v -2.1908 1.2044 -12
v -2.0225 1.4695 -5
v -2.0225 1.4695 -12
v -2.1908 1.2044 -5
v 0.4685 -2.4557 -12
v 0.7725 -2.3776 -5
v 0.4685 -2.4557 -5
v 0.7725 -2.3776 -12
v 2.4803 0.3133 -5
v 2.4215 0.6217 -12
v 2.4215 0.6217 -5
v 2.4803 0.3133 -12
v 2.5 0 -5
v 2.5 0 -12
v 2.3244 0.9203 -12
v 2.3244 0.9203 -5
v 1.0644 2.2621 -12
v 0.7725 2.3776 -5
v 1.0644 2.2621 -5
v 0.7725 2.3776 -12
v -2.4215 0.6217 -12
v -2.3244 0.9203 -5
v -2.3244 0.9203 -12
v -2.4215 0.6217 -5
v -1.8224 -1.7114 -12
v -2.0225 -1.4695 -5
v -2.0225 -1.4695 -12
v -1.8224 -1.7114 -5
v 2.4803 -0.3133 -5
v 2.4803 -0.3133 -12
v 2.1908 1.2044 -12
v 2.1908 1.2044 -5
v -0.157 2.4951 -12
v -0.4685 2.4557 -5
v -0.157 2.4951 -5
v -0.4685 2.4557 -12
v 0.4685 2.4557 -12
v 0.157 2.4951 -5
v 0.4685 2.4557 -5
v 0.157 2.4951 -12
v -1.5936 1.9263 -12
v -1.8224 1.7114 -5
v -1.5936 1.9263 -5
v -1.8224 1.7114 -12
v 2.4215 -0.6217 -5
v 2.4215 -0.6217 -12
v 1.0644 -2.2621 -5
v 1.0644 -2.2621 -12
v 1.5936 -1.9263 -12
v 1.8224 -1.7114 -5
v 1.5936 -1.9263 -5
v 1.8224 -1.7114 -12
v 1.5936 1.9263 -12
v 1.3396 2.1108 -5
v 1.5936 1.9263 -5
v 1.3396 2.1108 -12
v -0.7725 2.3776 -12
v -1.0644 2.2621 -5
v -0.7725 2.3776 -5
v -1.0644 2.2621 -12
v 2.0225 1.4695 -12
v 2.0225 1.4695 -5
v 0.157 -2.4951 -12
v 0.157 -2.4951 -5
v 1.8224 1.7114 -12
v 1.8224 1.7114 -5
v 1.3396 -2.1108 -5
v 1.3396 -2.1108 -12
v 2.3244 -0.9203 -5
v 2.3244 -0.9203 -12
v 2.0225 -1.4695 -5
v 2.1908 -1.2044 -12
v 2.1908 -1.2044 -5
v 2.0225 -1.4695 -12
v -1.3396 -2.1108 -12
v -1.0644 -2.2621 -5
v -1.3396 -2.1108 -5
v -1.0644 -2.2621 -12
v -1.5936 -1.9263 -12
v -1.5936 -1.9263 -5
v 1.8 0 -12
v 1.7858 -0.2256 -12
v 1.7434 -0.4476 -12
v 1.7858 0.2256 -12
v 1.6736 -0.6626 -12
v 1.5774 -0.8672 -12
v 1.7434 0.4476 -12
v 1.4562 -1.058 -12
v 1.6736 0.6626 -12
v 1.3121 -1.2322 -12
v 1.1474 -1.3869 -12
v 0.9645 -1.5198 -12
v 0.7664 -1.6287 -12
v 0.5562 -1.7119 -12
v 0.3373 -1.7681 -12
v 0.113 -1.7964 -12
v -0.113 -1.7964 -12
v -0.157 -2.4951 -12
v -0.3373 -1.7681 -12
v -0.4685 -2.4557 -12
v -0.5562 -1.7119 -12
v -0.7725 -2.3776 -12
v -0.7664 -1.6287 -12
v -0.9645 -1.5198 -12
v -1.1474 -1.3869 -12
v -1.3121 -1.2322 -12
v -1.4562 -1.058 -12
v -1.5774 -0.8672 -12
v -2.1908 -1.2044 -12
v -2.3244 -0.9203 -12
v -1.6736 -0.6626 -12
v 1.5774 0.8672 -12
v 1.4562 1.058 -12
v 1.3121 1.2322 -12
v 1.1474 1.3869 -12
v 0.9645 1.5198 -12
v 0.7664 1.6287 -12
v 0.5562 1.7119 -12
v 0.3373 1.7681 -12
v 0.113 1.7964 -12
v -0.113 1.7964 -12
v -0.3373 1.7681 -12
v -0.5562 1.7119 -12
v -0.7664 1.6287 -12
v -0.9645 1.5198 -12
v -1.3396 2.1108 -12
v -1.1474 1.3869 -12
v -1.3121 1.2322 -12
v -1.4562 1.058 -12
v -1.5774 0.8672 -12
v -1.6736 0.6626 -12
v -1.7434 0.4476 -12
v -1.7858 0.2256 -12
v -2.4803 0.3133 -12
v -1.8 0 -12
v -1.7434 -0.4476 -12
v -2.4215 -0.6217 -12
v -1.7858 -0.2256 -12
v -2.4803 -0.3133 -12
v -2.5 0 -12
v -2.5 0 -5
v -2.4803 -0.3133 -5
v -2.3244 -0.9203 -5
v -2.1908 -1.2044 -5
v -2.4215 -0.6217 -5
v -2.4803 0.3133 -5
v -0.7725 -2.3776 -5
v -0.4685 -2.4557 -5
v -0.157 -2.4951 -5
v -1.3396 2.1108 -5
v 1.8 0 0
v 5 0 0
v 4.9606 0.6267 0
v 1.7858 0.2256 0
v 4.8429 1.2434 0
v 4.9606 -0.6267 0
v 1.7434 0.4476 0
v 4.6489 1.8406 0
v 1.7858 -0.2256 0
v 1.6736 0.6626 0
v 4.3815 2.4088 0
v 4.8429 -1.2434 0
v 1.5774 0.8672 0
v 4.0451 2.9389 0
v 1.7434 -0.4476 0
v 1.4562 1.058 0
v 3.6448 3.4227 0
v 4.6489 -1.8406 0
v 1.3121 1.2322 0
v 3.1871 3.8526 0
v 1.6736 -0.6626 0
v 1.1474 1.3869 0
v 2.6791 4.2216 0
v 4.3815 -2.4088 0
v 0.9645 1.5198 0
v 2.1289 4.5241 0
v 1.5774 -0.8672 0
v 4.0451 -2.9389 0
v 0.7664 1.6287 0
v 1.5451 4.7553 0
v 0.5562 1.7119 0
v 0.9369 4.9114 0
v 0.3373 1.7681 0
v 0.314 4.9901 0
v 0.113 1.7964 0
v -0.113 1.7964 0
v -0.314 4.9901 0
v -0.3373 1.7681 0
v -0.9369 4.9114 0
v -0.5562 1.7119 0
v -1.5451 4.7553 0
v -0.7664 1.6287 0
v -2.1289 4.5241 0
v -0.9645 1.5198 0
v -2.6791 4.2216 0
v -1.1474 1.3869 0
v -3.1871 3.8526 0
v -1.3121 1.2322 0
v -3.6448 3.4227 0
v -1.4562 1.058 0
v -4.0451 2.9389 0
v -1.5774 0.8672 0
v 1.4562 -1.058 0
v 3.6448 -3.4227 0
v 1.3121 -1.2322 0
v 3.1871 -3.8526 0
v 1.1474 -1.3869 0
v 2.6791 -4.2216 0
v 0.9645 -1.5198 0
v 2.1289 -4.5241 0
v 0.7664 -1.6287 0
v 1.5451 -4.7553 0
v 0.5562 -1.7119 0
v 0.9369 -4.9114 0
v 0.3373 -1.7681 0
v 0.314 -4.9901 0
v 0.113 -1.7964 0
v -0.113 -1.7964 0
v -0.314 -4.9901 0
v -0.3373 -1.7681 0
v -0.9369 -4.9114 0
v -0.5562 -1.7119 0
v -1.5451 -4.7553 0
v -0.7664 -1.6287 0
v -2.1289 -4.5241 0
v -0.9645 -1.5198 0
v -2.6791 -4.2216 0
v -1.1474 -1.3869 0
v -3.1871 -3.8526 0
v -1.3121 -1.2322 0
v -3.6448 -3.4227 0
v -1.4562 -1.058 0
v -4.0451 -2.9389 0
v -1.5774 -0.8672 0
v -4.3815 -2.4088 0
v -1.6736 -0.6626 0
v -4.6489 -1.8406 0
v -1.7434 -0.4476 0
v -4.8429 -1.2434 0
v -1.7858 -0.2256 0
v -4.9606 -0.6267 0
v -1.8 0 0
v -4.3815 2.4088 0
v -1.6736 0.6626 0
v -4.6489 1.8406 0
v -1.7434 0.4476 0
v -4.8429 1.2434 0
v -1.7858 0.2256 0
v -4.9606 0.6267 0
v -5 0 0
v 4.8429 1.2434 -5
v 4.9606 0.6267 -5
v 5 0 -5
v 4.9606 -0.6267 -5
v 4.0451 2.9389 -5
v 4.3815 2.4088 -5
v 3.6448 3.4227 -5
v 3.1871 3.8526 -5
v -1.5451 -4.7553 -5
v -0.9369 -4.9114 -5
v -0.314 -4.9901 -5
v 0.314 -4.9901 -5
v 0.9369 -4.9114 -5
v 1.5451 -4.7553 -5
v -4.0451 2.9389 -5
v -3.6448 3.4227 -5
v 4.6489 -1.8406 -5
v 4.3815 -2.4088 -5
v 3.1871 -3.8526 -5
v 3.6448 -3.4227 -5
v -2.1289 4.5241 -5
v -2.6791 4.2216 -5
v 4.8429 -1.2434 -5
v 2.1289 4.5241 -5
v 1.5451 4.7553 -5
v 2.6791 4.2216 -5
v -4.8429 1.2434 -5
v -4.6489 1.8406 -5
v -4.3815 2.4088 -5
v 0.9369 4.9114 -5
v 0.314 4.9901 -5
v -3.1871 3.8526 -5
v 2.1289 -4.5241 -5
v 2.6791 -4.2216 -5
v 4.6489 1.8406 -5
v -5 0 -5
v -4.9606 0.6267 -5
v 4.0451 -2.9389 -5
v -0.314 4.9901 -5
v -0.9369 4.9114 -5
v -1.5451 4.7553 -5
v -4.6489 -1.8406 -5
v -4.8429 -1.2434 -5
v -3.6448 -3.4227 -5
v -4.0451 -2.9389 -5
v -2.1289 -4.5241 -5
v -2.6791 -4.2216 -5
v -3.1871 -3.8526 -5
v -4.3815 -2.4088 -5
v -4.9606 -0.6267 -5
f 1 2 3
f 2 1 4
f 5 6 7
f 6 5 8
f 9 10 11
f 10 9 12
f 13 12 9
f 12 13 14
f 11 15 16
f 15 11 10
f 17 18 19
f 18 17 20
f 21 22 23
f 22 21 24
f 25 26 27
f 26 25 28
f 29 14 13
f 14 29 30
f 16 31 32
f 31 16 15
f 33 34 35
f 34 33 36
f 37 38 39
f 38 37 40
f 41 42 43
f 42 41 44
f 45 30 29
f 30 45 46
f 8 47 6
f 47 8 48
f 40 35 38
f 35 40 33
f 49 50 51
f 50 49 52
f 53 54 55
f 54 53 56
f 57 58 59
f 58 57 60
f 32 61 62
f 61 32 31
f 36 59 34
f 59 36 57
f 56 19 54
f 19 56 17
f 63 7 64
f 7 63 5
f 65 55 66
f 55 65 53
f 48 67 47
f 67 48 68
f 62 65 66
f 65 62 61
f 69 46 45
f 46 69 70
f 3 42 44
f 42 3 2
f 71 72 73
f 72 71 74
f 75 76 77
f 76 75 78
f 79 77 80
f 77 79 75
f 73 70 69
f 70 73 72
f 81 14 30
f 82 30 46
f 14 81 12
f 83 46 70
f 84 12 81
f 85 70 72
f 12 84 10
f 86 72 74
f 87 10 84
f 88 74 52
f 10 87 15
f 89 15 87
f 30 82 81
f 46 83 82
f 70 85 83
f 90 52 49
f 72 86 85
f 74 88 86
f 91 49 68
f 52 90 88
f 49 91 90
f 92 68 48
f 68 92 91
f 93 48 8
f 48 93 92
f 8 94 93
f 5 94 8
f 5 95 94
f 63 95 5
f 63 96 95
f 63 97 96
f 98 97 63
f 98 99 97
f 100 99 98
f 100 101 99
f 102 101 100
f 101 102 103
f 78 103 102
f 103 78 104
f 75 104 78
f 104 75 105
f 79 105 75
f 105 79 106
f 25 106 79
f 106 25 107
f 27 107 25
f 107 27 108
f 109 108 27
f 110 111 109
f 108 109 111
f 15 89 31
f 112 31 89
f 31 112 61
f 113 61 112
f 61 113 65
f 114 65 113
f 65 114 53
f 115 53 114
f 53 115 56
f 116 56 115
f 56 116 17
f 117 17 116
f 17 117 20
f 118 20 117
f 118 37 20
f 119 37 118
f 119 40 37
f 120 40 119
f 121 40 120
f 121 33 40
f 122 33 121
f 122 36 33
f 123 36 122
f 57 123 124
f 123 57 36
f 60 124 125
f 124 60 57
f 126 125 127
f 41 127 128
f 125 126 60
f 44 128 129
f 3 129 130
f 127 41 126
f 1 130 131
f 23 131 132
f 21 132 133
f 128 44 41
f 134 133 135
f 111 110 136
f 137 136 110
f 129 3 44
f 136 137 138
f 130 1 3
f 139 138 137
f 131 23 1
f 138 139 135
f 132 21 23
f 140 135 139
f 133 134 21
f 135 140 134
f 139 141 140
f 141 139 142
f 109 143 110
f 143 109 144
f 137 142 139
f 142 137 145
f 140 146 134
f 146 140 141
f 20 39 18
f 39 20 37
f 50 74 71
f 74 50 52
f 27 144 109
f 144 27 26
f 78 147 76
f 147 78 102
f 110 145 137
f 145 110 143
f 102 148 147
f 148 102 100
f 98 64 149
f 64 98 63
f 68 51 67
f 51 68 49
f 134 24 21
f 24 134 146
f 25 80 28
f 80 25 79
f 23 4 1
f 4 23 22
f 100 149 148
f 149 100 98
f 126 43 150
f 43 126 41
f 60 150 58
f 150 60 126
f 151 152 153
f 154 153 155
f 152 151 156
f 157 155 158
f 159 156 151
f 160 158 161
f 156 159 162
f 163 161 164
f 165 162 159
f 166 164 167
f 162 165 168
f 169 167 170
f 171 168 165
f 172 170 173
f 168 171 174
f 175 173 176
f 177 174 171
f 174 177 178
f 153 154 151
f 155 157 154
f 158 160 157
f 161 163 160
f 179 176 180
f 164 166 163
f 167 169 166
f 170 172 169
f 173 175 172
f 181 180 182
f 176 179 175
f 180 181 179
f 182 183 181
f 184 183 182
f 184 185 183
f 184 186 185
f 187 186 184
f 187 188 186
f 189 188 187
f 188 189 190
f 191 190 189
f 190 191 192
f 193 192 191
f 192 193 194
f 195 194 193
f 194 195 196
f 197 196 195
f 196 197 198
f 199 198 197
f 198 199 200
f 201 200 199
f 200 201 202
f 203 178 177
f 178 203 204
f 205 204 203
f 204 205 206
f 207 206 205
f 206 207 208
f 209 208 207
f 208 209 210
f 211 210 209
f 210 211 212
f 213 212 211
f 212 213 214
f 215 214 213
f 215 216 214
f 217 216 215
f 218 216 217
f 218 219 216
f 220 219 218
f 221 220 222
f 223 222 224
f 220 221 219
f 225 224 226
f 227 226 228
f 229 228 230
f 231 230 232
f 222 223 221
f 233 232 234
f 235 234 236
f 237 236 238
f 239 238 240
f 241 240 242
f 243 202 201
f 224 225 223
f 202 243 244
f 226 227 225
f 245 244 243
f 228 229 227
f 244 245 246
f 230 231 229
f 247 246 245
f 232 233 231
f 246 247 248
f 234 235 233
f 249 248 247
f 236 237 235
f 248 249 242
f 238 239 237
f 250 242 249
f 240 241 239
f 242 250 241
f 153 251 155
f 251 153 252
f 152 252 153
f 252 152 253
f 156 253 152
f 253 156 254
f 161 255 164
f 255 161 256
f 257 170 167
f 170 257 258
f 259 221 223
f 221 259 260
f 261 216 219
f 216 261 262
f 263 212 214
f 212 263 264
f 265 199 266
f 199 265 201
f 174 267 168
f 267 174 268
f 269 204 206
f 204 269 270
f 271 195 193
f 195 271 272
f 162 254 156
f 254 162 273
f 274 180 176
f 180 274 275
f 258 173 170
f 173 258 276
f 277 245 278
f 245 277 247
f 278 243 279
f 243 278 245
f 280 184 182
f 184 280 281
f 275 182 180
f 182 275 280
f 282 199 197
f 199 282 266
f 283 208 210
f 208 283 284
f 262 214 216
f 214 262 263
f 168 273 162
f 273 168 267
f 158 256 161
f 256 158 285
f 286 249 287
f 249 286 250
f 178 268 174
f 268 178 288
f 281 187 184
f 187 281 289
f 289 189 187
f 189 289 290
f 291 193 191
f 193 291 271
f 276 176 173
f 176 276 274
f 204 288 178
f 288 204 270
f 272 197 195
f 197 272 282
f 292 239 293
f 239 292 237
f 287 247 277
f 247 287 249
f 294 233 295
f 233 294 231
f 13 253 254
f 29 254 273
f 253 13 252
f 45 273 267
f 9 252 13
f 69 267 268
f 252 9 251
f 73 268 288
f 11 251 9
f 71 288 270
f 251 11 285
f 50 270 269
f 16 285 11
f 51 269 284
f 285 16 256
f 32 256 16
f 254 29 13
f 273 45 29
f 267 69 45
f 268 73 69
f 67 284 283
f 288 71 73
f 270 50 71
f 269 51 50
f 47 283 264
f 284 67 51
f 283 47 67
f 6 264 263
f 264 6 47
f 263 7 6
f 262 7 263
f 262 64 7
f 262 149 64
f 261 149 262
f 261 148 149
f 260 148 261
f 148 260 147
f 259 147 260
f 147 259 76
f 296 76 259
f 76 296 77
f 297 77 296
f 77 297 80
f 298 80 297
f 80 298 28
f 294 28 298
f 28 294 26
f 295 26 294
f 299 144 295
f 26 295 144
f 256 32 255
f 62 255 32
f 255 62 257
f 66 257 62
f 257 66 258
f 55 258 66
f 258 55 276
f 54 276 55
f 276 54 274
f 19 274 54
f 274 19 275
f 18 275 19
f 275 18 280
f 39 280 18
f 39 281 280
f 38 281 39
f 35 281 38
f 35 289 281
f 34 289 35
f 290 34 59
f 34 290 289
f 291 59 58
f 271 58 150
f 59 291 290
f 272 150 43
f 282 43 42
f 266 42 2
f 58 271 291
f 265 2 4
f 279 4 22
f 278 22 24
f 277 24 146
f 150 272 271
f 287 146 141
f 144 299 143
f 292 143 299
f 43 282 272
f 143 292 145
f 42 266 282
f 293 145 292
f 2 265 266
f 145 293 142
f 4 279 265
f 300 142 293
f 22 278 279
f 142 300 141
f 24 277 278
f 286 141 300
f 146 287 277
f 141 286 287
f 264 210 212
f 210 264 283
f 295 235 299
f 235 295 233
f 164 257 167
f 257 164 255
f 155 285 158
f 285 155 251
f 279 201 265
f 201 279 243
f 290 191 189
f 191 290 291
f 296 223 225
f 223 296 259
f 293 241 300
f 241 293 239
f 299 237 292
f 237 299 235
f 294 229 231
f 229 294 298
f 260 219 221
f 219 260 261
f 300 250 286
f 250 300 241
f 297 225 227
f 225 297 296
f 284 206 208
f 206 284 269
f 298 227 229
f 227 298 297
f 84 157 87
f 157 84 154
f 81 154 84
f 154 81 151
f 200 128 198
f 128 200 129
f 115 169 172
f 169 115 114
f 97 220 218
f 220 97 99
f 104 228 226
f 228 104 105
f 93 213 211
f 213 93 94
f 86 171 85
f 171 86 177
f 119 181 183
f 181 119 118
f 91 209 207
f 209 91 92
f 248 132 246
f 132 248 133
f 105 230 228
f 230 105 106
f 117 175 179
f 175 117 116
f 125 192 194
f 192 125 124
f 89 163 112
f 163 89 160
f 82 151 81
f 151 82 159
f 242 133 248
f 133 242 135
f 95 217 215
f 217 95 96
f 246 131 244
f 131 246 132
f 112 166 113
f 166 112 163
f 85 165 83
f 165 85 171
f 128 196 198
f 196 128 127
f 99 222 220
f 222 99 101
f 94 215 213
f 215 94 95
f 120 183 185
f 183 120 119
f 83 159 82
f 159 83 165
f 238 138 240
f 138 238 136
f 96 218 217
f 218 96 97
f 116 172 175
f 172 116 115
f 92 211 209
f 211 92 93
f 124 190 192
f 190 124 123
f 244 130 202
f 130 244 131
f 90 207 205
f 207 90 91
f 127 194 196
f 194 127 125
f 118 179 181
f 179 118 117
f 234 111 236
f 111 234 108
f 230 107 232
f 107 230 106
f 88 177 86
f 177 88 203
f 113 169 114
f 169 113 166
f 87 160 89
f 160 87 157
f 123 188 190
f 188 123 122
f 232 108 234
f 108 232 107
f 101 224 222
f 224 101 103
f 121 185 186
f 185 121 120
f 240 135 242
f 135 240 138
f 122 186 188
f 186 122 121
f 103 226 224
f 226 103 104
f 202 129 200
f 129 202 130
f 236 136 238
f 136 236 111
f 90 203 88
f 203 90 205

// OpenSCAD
$fn = 50;


difference() {
	union() {
		translate(v = [0, 0, -12.0000000000]) {
			cylinder(h = 12, r = 2.5000000000);
		}
		translate(v = [0, 0, -5.0000000000]) {
			cylinder(h = 5, r = 5.0000000000);
		}
	}
	union() {
		#translate(v = [0, 0, -12]) {
			cylinder(h = 12, r = 1.8000000000);
		}
	}
}
